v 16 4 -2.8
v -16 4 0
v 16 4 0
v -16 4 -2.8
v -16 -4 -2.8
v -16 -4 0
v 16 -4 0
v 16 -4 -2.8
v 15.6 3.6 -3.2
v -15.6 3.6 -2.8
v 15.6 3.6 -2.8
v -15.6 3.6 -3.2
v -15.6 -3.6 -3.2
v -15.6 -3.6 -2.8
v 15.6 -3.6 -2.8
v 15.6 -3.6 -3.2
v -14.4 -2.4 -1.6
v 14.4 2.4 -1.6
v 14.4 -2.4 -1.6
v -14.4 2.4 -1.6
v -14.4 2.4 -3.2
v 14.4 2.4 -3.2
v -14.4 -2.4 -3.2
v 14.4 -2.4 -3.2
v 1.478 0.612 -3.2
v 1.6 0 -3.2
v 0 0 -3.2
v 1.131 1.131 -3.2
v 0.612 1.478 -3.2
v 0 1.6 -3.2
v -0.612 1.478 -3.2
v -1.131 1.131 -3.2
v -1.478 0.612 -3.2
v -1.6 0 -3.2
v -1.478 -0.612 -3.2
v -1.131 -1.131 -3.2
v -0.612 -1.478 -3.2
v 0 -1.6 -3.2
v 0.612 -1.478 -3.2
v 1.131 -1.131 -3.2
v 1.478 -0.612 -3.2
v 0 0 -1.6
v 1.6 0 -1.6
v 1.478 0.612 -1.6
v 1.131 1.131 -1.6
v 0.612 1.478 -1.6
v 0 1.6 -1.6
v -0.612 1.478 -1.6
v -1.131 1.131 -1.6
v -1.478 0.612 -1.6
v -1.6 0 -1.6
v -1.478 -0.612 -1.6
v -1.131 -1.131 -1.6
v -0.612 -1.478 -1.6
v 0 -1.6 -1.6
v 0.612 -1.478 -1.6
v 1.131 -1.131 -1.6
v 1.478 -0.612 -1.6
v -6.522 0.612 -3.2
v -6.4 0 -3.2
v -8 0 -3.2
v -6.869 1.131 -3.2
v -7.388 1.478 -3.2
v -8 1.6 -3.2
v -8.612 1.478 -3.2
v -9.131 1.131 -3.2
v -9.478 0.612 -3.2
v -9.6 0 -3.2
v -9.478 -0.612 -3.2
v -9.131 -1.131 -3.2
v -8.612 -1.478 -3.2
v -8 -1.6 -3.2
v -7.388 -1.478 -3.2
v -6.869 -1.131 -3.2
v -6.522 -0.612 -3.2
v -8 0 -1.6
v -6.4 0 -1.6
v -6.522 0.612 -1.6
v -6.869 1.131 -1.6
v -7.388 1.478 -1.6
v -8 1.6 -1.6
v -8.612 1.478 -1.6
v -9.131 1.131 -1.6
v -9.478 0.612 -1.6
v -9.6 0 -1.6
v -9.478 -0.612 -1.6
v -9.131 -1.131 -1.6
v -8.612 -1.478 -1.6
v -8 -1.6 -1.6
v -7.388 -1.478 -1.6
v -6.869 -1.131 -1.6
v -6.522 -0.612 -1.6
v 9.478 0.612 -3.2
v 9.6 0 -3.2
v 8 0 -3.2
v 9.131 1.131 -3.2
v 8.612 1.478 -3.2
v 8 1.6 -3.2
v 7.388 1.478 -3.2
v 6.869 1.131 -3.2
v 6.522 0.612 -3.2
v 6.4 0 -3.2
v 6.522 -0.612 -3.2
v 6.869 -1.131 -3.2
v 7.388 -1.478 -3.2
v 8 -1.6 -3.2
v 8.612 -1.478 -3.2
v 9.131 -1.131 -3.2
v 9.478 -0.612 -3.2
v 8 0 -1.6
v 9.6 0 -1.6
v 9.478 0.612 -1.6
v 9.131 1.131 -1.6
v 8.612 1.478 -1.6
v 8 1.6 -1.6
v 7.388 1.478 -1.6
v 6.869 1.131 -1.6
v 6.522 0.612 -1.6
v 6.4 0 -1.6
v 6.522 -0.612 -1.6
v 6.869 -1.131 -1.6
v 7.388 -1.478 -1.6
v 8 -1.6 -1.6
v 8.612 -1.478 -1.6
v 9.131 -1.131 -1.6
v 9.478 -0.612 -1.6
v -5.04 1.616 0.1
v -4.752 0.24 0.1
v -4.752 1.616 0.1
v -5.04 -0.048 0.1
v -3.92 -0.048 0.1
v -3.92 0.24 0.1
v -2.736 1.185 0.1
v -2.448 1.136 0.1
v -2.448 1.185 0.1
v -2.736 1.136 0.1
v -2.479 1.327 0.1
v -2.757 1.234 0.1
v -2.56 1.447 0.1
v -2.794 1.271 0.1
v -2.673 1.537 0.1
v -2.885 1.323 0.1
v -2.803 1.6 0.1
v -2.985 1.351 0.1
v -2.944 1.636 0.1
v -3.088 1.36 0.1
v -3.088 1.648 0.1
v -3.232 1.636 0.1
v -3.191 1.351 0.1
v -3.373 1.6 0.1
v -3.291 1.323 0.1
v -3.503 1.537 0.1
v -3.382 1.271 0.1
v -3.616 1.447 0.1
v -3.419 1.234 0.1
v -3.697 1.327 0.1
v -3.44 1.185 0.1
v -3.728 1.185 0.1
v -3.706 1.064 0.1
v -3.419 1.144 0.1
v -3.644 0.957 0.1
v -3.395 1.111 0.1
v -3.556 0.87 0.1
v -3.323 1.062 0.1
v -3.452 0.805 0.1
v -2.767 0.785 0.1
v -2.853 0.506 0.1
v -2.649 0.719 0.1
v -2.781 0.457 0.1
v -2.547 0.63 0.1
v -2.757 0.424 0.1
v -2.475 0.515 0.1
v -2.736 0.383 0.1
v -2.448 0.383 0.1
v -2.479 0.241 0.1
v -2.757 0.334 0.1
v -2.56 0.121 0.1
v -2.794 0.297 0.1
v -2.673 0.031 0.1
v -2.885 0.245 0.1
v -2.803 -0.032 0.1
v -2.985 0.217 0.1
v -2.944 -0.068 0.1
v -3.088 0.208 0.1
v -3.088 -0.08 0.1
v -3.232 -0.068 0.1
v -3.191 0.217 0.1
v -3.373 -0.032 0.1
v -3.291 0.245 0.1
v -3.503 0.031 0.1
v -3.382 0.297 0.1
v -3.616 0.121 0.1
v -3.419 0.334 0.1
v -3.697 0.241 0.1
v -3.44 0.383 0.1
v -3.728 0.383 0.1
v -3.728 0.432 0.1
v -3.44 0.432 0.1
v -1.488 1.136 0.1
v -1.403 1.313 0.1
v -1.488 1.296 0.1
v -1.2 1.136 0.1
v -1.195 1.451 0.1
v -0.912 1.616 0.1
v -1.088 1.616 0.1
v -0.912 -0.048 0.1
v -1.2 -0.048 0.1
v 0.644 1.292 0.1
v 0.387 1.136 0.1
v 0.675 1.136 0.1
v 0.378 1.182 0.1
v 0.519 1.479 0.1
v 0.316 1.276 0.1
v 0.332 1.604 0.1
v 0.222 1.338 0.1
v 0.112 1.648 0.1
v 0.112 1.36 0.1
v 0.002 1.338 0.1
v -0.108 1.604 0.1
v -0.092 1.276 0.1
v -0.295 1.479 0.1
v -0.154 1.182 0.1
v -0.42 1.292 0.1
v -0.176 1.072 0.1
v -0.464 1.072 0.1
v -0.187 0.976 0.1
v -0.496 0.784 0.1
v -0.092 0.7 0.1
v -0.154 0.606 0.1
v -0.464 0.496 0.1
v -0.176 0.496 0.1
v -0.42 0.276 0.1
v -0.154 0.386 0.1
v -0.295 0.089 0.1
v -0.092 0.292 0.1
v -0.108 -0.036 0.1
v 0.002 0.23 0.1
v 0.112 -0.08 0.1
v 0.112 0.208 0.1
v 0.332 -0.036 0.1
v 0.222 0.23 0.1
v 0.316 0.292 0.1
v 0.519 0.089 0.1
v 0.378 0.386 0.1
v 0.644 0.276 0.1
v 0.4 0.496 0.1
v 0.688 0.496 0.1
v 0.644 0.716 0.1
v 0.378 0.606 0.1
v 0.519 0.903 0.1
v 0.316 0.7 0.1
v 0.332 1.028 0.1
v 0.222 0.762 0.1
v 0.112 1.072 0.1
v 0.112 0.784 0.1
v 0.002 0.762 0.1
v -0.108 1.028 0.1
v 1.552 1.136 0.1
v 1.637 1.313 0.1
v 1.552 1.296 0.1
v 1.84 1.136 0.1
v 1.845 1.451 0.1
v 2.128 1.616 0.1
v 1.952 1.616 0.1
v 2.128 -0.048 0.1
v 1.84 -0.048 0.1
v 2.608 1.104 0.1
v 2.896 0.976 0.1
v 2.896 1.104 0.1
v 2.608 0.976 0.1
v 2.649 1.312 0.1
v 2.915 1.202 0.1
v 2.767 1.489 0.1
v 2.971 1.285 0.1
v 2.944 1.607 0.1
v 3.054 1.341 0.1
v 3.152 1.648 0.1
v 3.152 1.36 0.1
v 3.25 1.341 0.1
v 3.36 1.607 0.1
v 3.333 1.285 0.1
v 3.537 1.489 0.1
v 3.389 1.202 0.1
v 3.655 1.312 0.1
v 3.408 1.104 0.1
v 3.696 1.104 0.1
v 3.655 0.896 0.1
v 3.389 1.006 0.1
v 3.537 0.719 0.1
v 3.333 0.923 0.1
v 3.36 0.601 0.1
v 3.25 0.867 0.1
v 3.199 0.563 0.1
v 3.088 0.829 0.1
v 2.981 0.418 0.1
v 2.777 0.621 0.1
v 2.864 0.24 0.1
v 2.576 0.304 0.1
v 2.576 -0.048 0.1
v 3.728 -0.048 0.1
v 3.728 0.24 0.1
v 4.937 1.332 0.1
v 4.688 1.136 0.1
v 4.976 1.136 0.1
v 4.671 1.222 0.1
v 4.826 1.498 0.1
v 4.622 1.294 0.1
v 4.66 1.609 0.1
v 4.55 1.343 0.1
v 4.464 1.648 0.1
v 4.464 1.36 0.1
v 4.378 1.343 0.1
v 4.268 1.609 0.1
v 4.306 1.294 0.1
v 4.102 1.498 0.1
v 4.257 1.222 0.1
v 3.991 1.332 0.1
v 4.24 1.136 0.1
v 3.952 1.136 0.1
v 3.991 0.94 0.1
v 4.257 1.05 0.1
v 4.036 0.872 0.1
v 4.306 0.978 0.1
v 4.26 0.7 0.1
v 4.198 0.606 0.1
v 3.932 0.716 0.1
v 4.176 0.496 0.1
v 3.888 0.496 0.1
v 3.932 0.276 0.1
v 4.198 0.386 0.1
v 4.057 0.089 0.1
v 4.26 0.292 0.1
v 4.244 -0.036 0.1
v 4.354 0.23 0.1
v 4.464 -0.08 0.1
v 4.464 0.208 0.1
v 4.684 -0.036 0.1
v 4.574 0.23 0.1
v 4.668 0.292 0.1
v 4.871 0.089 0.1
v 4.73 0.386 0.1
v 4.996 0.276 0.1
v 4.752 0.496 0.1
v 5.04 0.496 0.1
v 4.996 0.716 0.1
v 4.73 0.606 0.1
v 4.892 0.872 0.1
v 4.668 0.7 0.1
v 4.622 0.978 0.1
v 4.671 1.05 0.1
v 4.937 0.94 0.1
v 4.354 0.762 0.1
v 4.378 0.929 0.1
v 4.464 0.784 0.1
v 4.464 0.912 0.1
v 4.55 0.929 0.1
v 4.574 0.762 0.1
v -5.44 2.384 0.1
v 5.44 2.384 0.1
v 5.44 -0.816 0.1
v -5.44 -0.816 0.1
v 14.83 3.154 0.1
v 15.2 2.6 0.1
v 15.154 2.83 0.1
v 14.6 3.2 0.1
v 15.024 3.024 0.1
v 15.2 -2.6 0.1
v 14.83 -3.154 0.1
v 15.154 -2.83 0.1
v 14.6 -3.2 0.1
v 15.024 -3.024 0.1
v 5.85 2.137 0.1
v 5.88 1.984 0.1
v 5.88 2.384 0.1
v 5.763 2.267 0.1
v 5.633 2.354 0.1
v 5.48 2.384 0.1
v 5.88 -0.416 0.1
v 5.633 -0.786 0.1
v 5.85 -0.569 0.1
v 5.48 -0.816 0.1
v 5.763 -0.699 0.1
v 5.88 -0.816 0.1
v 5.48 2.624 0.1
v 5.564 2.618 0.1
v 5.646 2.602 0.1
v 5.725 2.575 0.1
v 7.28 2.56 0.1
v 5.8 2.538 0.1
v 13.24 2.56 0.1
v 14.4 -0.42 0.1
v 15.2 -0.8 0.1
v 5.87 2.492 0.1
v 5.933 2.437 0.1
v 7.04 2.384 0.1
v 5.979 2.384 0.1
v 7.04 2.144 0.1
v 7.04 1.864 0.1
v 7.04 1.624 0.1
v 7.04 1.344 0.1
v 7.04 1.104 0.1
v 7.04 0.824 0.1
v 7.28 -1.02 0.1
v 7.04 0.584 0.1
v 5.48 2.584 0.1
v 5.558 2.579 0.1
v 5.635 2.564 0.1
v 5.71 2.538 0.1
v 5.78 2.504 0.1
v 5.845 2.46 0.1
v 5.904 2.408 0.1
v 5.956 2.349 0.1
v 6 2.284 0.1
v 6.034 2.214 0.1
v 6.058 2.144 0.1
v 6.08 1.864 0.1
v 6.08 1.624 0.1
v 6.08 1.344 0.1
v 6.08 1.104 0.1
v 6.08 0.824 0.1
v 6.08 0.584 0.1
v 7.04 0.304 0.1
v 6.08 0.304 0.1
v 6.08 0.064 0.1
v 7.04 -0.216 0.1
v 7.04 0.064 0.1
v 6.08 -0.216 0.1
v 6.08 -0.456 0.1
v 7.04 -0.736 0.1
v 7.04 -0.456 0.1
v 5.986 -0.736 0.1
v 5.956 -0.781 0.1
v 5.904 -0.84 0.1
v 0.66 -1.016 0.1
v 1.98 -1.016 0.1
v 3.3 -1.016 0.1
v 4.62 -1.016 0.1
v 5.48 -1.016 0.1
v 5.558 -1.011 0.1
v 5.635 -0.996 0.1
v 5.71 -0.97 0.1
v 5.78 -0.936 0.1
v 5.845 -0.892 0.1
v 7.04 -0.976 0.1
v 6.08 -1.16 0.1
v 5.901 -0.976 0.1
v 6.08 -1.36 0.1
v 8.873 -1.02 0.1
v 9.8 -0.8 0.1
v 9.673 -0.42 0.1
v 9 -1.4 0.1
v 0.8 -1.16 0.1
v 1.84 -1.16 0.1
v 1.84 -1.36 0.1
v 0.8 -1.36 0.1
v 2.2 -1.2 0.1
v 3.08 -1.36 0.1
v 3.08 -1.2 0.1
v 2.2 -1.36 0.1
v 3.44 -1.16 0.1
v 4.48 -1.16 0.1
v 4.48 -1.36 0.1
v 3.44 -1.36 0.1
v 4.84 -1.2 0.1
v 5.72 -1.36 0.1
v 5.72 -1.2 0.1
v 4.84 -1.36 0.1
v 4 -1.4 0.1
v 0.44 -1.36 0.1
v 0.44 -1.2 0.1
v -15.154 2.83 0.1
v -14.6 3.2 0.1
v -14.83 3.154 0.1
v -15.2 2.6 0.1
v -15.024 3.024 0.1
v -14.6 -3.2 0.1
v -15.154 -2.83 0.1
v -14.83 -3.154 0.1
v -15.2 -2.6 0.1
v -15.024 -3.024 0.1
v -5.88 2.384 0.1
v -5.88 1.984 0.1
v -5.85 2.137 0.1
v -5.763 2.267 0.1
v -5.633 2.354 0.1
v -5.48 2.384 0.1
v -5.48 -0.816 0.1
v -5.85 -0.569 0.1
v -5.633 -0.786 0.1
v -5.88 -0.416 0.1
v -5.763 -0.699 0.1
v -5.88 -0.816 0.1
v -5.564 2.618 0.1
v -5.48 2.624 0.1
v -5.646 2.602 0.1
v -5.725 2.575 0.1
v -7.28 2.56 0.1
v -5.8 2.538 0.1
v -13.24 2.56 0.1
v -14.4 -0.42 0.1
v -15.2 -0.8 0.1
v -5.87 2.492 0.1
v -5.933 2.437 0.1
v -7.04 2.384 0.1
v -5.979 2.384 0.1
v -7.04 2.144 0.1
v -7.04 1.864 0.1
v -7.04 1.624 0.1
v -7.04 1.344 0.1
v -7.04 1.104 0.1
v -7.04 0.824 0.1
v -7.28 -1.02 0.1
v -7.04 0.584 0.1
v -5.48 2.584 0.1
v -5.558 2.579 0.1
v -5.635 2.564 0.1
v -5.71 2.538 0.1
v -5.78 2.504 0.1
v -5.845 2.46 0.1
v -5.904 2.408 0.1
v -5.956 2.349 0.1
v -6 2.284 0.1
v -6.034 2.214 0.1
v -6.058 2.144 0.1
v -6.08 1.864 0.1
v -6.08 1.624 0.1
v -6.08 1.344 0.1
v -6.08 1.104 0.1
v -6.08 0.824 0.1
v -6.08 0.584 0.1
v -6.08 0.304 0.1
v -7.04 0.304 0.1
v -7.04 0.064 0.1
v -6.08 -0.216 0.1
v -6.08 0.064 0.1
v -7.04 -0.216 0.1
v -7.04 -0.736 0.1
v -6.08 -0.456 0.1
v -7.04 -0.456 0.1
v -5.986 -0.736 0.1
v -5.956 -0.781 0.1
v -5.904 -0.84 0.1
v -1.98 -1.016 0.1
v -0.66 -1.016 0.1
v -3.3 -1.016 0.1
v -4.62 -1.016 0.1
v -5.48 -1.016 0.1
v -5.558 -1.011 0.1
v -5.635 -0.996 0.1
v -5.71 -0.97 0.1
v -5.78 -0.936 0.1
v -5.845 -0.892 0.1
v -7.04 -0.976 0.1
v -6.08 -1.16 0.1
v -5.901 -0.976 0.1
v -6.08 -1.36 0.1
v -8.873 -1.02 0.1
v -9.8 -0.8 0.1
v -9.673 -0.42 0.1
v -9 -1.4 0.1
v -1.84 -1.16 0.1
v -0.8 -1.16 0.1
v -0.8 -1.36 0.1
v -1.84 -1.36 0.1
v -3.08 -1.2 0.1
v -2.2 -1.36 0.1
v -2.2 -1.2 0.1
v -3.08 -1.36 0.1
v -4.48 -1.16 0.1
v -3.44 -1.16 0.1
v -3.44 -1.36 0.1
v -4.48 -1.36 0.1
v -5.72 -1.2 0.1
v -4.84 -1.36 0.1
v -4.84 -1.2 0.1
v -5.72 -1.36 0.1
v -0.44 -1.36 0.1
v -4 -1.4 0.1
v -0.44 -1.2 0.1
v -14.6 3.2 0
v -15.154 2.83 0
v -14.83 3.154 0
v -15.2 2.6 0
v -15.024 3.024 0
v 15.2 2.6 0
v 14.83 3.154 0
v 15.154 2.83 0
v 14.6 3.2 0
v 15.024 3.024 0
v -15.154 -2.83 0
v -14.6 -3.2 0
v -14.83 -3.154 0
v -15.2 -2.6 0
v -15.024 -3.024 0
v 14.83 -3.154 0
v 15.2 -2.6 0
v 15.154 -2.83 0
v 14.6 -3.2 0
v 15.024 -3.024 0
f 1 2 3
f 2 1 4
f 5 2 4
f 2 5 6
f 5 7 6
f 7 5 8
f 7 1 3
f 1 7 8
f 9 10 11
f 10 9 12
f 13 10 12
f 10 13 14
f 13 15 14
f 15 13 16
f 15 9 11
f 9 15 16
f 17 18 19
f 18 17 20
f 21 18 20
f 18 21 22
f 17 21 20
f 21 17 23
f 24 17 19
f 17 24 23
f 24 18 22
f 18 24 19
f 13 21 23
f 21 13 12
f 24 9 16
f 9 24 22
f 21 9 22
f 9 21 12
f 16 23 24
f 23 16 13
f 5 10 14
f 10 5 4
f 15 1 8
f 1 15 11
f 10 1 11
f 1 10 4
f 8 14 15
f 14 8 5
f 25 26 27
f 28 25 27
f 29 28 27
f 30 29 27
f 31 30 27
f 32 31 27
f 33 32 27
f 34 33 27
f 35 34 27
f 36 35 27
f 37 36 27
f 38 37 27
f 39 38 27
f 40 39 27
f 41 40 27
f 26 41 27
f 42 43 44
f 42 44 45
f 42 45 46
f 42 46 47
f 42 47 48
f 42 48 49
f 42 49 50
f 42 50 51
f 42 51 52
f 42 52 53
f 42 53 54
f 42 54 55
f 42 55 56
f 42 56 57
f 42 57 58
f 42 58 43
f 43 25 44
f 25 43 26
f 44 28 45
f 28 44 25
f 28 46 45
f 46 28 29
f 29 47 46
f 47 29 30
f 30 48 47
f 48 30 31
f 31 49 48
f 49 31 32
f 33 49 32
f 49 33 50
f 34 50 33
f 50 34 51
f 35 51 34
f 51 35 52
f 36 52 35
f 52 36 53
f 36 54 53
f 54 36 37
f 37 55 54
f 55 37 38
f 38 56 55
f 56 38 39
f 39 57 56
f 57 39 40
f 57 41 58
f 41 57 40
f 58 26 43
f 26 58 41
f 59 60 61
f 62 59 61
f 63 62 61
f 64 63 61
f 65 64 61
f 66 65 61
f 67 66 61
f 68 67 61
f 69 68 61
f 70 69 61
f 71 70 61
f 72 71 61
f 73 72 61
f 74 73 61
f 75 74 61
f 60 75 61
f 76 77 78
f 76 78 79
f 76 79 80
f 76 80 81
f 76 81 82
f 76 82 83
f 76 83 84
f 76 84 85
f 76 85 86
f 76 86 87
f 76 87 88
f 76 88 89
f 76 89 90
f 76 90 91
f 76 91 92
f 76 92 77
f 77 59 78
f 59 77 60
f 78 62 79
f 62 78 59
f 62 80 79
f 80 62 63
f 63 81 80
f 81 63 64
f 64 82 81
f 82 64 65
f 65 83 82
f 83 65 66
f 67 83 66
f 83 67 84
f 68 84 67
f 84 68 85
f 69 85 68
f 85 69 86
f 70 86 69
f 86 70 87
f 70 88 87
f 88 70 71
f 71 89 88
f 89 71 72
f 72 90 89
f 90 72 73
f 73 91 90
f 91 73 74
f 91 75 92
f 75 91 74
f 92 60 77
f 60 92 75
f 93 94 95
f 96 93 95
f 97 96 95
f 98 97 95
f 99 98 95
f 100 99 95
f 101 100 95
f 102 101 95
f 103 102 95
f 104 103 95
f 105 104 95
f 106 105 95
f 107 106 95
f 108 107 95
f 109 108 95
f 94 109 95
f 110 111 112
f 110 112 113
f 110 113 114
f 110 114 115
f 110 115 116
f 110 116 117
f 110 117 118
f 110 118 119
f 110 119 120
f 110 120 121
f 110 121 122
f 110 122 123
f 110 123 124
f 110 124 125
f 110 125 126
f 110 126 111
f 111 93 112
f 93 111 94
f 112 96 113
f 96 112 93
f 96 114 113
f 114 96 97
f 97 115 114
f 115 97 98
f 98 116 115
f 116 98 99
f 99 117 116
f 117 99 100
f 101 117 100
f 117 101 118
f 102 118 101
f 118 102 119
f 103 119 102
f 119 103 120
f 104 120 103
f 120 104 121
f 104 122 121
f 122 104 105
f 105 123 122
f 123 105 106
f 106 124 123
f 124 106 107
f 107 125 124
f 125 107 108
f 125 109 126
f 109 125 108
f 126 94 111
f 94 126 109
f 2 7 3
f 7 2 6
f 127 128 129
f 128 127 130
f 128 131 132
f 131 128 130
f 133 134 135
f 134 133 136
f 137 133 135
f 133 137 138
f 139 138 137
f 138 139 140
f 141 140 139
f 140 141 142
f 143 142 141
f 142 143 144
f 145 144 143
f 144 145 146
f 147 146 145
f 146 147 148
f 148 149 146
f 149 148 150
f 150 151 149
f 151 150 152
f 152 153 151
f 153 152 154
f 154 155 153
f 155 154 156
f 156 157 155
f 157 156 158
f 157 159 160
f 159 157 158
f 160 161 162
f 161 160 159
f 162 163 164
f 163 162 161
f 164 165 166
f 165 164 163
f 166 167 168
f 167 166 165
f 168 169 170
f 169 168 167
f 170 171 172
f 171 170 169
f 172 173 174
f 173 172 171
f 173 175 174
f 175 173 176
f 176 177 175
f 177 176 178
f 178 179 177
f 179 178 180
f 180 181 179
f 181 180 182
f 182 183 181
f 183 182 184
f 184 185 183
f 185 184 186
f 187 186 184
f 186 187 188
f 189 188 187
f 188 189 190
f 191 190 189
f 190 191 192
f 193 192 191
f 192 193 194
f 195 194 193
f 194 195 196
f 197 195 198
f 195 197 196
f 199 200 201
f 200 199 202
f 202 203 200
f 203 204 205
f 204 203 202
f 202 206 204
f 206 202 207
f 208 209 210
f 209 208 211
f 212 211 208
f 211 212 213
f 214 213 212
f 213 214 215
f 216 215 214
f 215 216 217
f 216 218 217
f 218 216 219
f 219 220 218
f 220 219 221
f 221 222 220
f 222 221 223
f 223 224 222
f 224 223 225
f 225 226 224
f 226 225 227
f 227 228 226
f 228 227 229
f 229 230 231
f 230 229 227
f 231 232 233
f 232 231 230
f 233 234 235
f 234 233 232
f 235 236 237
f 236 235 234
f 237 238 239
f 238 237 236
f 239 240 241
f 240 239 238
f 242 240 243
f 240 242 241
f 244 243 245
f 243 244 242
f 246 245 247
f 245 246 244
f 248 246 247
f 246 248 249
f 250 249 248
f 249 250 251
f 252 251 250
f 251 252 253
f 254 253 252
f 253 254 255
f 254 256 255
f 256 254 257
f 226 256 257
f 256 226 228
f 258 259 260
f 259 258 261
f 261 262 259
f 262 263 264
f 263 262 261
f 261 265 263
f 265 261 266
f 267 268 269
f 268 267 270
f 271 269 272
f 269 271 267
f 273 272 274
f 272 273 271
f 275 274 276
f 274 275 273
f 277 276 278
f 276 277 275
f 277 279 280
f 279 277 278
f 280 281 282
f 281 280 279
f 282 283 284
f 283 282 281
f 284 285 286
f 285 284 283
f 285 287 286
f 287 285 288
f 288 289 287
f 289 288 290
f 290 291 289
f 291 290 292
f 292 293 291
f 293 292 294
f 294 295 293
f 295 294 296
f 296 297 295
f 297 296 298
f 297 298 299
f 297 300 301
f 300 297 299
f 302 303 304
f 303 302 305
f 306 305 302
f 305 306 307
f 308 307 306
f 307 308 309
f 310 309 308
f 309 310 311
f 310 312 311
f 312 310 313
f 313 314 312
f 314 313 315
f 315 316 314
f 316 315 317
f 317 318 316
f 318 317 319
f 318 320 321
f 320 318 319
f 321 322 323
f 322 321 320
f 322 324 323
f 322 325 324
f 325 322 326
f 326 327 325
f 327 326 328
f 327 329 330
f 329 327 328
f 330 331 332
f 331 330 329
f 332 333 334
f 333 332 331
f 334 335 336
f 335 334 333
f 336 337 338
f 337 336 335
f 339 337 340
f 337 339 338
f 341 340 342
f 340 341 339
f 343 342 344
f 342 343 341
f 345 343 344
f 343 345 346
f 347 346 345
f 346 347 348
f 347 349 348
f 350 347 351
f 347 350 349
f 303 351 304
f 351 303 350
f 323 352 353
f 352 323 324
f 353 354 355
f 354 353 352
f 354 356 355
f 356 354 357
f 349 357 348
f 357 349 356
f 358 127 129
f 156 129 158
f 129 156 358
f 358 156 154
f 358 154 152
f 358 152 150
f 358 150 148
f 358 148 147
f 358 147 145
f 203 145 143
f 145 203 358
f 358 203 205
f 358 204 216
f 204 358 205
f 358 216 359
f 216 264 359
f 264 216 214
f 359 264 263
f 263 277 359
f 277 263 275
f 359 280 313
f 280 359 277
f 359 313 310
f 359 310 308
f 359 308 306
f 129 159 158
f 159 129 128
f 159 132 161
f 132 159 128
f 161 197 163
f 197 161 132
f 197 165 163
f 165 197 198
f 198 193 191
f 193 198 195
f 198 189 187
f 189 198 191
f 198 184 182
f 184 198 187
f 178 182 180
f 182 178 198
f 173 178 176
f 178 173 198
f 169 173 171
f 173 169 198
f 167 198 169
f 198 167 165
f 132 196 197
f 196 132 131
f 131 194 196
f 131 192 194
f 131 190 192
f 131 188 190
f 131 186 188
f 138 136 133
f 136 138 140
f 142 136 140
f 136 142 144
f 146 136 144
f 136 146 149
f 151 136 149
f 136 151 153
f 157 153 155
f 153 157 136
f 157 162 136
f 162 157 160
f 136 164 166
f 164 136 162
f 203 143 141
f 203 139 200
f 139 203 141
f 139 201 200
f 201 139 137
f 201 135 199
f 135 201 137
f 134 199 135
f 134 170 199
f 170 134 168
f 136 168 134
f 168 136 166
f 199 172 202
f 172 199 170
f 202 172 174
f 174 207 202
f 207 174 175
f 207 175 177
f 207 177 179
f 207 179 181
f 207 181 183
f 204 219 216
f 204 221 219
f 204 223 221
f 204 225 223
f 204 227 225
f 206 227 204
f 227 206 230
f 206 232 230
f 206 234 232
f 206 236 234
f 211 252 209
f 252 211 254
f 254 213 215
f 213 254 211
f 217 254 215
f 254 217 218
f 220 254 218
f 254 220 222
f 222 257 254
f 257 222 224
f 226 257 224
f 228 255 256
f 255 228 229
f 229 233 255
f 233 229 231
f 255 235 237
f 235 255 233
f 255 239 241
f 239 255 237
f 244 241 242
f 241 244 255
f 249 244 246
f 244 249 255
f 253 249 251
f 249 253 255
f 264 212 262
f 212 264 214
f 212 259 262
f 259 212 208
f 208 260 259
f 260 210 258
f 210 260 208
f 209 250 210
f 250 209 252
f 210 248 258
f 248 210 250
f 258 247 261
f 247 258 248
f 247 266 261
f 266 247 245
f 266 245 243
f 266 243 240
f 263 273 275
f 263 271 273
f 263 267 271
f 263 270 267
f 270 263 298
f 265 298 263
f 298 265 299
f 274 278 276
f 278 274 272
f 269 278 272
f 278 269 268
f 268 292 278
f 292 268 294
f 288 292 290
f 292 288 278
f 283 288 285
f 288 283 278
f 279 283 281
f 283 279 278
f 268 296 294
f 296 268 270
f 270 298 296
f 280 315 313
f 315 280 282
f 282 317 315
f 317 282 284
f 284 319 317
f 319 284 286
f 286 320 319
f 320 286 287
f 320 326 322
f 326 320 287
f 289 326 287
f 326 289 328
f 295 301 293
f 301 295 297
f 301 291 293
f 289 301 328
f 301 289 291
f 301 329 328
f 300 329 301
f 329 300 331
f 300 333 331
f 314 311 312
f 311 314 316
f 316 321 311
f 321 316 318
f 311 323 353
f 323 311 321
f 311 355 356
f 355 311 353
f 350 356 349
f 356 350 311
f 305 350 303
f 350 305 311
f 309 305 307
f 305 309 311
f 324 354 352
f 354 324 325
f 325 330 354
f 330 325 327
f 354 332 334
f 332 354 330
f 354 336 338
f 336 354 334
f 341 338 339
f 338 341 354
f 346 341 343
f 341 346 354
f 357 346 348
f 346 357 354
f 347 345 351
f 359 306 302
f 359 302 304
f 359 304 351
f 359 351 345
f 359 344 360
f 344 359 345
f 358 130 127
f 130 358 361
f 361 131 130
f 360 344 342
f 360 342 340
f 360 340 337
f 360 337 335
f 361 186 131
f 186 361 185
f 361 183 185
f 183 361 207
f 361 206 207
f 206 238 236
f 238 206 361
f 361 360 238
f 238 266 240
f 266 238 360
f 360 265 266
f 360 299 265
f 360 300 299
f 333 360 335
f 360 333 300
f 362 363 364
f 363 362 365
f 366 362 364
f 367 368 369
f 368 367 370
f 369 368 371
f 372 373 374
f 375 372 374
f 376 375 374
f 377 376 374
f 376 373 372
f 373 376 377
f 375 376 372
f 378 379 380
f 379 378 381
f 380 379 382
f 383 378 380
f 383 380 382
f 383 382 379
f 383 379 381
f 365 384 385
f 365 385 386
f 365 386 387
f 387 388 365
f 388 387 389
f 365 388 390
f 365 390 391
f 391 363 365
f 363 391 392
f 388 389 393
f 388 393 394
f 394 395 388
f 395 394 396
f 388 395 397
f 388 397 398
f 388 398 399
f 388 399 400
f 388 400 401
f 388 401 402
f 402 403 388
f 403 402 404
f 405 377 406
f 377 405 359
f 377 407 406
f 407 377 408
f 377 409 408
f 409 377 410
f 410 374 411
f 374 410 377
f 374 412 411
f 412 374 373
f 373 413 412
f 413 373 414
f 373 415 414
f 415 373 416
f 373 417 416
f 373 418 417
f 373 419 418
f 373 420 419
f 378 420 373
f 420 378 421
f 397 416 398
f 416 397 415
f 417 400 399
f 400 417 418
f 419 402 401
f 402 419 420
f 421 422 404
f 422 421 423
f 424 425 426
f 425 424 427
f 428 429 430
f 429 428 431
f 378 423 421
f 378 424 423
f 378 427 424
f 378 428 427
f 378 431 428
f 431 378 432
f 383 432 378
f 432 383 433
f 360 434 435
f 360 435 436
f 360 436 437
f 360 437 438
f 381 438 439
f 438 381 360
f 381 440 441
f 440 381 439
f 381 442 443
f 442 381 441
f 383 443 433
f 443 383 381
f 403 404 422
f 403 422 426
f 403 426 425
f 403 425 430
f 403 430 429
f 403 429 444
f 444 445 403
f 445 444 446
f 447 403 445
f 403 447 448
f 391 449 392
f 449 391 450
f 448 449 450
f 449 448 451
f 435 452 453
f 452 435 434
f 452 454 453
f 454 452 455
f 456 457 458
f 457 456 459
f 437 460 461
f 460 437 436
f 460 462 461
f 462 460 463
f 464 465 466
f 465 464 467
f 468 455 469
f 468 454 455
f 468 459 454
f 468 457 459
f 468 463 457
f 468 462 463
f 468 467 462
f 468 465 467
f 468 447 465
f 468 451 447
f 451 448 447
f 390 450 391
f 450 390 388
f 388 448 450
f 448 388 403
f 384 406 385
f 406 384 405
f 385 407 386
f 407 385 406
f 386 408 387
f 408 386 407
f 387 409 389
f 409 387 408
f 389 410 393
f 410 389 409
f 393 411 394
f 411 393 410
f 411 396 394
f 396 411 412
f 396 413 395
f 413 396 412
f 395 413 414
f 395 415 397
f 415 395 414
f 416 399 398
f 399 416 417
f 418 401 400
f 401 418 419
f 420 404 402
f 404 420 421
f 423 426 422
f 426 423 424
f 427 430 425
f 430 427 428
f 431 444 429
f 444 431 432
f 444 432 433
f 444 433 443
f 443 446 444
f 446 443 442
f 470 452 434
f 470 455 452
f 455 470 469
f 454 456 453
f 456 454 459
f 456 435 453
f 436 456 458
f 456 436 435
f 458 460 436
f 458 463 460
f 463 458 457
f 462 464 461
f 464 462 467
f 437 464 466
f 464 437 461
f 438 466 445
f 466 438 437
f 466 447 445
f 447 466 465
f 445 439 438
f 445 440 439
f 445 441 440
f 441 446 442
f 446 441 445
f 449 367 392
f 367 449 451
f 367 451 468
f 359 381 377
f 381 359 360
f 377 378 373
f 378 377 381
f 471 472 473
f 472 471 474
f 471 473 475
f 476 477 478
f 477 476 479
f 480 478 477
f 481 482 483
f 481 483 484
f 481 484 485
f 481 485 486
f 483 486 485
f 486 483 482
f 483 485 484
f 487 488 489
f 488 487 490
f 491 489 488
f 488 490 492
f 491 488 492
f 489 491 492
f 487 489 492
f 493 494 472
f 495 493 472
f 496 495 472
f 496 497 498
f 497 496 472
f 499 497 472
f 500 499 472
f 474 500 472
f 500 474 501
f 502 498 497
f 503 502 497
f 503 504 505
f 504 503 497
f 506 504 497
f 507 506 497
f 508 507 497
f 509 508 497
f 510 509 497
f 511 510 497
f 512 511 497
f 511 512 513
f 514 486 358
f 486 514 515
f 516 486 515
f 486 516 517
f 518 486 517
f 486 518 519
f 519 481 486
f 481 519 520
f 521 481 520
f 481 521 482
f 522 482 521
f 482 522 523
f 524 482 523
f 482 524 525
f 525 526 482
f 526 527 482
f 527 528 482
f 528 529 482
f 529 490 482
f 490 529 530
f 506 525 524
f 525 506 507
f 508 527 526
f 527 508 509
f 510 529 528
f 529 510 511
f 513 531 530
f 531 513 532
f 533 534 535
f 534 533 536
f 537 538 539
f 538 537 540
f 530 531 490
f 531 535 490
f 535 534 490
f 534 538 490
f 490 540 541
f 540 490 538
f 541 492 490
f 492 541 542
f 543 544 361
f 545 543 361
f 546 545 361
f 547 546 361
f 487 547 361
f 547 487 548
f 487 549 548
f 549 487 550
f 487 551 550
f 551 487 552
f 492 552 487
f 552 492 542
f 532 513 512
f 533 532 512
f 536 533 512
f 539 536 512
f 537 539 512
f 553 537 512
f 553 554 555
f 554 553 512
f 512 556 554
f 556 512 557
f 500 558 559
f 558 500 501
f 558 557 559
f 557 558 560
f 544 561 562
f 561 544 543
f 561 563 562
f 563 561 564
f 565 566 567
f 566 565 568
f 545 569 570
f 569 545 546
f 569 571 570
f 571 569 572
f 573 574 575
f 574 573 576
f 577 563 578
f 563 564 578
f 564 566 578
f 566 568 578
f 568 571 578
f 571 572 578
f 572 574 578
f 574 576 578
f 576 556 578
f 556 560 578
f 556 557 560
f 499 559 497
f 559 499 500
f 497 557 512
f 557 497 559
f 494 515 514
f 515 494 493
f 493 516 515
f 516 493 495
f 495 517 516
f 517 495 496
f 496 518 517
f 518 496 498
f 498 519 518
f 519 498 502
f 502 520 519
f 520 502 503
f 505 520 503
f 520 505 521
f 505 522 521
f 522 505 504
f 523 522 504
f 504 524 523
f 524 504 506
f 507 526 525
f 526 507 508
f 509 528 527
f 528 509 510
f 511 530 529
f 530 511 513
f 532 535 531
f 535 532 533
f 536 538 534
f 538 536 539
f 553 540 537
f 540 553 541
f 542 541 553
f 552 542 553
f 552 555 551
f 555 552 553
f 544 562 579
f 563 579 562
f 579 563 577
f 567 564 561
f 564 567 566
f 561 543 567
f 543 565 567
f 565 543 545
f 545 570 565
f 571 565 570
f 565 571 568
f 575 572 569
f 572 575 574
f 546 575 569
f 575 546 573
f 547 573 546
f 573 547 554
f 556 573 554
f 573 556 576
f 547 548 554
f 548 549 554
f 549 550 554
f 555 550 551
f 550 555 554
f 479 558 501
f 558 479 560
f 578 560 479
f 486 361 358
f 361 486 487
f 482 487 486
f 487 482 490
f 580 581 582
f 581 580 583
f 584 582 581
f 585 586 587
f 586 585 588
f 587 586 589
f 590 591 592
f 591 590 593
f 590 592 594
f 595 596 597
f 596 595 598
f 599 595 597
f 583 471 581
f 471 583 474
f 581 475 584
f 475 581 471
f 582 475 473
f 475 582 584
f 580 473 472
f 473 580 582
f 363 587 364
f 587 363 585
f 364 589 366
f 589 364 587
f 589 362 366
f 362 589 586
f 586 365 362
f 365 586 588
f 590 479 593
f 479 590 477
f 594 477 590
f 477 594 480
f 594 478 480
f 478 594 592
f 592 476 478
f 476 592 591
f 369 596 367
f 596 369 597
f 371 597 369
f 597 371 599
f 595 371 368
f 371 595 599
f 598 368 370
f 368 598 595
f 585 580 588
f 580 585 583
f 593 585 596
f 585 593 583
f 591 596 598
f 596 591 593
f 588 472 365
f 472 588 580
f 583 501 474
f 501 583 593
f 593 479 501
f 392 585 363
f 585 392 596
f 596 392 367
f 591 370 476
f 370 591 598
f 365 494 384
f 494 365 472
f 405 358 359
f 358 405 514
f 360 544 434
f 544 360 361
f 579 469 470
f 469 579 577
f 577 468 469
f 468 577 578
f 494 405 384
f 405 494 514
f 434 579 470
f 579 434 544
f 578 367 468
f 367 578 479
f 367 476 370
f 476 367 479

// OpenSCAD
use <../lib.scad>
use <2431.scad>
use <6141875v.scad>
function ldraw_lib__2431d18() = [
// 0 Tile  1 x  4 with Black License Plate "LS 16 128" on White Background Sticker
// 0 Name: 2431d18.dat
// 0 Author: Alfred Schmitz [AlfredS]
// 0 !LDRAW_ORG Shortcut UPDATE 2026-08
// 0 !LICENSE Licensed under CC BY 4.0 : see CAreadme.txt
// 
// 0 BFC CERTIFY CCW
  [0,"BFC","CERTIFY"],
  [0,"BFC","CCW"],
// 
// 0 !CATEGORY Sticker Shortcut
// 0 !KEYWORDS F-150, Ford, Raptor, Set 75875, Speed Champions
// 
// 0 !HISTORY 2026-08-31 [OrionP] Official Update 2026-08
// 
// 1 16 0 0 0 1 0 0 0 1 0 0 0 1 2431.dat
  [1,16,0,0,0,1,0,0,0,1,0,0,0,1, ldraw_lib__2431()],
// 1 16 0 0 0 1 0 0 0 1 0 0 0 1 6141875v.dat
  [1,16,0,0,0,1,0,0,0,1,0,0,0,1, ldraw_lib__6141875v()],
];
module ldraw_lib__2431d18(step=0, col=false, unit=2/5, alt=false, line=0.2, solid=!$preview)
    makepoly(ldraw_lib__2431d18(), step=step, col=col, unit=unit, alt=alt, line=line, solid=solid);
ldraw_lib__2431d18(line=0.2);
